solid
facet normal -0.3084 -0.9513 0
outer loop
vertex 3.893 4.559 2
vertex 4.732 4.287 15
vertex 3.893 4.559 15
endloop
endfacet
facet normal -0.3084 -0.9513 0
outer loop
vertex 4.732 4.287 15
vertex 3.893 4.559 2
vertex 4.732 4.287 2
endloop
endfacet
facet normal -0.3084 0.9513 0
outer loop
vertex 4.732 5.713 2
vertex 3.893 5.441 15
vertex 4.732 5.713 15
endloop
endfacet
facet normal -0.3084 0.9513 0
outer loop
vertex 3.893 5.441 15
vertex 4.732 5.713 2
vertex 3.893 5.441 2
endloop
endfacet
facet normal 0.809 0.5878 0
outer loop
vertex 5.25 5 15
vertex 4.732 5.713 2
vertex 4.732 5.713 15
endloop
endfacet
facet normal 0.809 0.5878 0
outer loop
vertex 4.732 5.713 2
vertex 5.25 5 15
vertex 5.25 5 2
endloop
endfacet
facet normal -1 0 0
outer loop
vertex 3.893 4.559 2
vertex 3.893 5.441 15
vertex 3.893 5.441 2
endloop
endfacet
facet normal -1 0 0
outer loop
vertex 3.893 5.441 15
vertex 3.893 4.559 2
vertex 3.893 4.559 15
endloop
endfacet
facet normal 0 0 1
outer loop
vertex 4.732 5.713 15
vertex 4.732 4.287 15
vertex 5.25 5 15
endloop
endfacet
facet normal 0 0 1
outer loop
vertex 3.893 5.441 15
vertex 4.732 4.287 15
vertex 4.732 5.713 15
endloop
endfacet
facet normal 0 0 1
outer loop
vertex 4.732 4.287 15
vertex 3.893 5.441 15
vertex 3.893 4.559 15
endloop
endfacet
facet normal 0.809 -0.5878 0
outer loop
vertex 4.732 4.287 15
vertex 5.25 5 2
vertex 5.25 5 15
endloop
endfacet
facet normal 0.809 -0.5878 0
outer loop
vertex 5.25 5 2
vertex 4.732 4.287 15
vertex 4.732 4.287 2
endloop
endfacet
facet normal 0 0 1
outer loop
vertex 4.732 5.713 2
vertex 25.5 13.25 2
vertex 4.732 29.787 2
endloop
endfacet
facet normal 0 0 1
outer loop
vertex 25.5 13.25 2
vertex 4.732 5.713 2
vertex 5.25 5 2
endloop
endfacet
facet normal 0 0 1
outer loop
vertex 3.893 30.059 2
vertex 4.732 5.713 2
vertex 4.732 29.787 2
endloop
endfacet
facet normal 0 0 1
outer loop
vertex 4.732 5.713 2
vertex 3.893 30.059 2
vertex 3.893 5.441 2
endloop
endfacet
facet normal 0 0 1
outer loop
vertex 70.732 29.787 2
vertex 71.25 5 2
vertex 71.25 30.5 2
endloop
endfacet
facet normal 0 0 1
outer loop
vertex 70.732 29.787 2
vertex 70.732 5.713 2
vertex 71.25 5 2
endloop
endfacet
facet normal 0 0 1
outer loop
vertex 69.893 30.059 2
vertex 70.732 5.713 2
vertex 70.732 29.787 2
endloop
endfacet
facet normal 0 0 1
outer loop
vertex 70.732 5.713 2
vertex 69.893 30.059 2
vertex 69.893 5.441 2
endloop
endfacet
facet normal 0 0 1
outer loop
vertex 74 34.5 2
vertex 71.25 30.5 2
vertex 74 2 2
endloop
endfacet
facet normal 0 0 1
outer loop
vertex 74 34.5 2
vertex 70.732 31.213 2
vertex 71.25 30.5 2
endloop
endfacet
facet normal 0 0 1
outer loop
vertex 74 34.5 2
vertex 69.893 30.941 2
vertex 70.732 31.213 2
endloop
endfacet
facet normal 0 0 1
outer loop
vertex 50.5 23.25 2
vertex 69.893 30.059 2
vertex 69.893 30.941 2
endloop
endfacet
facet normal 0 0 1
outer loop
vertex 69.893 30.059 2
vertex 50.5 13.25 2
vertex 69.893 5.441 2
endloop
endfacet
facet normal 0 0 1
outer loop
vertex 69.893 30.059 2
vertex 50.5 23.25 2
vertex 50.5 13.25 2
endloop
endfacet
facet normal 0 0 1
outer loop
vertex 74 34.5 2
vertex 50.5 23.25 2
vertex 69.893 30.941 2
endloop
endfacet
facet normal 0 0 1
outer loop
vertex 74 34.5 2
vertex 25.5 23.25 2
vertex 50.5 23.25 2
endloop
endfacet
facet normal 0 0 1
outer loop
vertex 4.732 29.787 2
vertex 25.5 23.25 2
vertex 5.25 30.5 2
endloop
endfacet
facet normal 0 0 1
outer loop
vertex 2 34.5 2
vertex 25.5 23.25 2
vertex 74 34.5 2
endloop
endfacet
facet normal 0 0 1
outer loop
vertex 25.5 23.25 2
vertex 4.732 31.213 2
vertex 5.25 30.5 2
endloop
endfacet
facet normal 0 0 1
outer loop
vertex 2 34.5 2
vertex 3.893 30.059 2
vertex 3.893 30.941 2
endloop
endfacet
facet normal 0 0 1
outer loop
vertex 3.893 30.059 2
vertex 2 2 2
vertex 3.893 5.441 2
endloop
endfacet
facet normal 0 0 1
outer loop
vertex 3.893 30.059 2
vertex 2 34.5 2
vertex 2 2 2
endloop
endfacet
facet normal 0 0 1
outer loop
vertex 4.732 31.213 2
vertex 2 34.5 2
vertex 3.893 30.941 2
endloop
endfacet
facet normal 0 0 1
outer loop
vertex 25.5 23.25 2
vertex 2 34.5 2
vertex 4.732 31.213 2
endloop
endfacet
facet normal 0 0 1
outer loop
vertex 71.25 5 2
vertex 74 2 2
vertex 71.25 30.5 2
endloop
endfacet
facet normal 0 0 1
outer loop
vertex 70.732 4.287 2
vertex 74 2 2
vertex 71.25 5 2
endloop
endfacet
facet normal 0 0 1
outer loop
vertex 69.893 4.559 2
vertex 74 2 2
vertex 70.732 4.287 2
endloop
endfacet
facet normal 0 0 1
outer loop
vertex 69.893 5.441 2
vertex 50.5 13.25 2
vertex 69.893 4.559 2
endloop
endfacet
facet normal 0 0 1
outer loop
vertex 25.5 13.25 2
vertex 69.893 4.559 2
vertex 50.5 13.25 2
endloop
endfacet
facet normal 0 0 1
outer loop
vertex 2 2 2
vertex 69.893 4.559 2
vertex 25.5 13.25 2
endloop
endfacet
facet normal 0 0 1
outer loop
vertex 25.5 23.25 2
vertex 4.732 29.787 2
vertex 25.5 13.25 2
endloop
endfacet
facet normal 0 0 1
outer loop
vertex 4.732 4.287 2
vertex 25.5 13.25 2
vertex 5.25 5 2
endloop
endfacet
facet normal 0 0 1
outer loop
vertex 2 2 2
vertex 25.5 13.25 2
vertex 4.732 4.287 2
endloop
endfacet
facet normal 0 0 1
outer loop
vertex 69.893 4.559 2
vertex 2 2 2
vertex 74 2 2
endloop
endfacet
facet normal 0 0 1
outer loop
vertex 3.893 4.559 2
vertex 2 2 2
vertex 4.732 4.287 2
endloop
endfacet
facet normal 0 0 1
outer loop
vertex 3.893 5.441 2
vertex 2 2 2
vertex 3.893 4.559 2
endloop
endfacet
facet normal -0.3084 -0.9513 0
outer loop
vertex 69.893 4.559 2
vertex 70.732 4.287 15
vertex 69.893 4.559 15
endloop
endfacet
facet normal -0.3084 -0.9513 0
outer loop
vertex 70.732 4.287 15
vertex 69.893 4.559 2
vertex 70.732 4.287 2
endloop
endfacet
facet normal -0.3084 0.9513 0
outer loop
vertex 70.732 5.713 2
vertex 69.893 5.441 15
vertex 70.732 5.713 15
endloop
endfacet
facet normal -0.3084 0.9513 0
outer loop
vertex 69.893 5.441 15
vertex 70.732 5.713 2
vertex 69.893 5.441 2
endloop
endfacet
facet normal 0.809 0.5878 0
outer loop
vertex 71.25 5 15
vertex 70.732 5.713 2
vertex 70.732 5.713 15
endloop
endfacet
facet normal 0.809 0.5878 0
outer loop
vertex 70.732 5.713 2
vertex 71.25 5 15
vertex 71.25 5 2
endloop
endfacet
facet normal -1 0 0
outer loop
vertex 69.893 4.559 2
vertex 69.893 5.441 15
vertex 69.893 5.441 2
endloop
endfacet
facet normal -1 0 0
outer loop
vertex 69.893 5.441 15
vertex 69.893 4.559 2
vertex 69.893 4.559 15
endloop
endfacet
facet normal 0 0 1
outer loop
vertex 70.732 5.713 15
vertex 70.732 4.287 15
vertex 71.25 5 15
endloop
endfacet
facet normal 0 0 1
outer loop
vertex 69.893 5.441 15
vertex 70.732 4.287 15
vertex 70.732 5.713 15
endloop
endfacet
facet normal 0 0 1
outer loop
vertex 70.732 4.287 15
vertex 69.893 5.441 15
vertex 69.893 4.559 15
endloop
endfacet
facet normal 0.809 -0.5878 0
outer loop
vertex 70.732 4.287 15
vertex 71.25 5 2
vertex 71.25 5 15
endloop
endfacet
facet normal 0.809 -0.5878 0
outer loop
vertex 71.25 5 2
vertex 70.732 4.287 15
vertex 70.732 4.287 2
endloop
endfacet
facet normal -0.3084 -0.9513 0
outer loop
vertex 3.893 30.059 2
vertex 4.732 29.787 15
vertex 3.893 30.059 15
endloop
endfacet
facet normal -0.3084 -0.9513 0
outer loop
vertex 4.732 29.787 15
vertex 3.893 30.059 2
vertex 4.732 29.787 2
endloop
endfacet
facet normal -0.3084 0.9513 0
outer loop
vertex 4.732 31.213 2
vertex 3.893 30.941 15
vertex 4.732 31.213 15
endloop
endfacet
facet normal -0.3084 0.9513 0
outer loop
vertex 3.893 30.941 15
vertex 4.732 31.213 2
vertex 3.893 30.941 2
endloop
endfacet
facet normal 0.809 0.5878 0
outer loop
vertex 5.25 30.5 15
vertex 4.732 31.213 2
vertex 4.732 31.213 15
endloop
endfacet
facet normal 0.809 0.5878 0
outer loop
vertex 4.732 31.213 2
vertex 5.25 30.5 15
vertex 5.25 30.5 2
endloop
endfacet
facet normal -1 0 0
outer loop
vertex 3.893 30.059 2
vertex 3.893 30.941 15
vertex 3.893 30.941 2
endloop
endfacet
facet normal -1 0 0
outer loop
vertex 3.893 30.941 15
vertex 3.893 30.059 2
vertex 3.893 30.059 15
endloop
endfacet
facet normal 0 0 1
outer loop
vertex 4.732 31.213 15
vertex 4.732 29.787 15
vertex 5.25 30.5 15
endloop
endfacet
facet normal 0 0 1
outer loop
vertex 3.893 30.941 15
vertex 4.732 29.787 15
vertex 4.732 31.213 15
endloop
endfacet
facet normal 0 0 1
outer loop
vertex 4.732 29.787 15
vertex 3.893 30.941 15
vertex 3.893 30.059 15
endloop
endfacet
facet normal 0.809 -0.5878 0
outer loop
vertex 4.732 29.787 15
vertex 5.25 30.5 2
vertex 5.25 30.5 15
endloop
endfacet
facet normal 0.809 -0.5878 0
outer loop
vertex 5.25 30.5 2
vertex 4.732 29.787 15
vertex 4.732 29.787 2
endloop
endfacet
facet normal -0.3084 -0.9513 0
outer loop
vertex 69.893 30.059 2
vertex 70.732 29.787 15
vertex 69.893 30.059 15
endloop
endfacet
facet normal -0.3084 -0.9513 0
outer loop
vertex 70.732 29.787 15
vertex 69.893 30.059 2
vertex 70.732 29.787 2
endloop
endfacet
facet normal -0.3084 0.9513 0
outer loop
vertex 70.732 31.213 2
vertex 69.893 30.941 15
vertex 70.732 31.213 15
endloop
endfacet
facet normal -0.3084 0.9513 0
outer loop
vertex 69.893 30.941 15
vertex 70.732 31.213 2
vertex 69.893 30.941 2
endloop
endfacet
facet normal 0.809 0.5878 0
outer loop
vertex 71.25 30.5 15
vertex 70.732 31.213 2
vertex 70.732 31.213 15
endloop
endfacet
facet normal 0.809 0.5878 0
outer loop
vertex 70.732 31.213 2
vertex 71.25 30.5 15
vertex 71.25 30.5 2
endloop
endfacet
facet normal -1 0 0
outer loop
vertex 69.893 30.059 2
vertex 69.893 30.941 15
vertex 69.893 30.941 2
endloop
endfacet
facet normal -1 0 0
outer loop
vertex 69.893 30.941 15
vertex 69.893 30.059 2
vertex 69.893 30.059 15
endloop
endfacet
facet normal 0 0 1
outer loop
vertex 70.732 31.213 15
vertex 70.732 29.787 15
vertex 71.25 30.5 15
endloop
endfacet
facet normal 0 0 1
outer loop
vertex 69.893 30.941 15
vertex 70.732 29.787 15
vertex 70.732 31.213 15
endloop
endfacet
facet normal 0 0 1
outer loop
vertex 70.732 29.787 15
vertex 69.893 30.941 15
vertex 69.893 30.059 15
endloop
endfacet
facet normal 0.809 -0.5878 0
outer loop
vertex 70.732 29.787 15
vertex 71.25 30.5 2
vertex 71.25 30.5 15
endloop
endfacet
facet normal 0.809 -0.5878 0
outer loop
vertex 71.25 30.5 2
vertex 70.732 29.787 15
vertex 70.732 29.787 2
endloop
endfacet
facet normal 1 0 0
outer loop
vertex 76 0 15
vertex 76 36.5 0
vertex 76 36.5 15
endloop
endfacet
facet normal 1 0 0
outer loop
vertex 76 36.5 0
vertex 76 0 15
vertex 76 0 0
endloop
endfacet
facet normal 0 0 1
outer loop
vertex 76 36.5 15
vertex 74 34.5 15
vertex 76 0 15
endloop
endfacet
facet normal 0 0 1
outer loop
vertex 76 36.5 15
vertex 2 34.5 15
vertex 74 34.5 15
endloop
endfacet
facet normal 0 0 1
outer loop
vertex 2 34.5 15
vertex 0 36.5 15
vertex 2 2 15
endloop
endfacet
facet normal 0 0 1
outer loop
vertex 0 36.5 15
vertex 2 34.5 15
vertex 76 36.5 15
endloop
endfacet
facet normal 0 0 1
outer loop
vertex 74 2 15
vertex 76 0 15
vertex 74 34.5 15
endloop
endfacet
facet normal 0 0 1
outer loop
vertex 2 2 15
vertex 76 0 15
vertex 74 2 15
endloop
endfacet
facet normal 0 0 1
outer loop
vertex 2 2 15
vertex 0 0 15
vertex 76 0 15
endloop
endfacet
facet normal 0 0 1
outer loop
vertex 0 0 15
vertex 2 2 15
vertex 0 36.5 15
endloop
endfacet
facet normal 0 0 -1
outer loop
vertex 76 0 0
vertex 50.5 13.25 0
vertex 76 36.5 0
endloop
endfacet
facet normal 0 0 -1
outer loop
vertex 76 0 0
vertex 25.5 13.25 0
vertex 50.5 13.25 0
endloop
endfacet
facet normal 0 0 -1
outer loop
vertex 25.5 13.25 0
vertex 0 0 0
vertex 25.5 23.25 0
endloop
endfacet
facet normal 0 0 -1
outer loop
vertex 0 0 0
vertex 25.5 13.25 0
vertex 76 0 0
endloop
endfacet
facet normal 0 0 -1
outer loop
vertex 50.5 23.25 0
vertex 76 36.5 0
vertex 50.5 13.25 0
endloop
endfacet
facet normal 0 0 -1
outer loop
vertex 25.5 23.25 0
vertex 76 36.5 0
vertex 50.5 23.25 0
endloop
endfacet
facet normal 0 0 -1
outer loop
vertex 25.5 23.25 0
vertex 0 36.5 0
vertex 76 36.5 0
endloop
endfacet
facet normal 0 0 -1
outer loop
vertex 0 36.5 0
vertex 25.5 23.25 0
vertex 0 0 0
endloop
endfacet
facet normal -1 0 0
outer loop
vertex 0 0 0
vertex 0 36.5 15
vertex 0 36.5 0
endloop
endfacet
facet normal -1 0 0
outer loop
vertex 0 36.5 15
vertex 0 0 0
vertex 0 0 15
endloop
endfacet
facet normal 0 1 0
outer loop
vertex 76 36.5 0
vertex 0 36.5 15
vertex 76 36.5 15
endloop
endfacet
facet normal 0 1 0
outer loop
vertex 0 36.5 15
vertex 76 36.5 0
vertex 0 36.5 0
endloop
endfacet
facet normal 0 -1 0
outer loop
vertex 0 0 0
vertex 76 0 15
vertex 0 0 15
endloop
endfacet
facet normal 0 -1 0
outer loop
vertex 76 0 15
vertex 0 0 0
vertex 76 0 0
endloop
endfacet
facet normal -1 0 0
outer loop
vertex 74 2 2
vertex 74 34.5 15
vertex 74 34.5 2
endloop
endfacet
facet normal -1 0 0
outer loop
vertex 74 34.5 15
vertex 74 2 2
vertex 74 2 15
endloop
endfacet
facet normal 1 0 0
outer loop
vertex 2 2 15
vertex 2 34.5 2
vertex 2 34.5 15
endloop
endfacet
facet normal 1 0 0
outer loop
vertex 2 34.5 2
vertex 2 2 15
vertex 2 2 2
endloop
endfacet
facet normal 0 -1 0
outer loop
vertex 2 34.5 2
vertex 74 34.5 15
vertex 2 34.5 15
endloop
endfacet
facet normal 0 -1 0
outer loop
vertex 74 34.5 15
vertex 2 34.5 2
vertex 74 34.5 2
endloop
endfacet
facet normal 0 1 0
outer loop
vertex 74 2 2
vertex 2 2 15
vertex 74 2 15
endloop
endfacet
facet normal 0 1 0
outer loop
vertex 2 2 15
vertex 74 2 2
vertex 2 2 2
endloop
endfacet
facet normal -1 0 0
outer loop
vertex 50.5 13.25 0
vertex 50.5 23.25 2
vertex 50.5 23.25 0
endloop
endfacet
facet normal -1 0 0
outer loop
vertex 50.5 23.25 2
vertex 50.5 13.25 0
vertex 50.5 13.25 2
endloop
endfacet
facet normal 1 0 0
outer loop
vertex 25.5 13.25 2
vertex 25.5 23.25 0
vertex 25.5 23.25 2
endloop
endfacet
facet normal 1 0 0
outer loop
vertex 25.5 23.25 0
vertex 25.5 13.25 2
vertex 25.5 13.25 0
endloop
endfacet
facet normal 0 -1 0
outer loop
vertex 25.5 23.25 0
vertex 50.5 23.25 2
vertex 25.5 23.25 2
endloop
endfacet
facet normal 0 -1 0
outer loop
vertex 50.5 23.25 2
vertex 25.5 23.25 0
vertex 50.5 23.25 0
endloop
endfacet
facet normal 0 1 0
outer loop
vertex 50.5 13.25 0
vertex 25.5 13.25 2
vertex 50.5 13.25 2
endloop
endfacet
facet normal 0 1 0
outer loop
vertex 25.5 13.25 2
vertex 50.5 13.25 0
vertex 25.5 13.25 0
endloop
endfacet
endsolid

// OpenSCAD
BUFFER = 1;
BOARD_LENGTH = 70;
BOARD_DEPTH = 30.5;
HOLE_DIAMETER = 1.5;
HOLE_OFFSET_BOTTOM = 2;
HOLE_OFFSET_LEFT = 1.5;
HOLE_LENGTH = 66;
HOLE_DEPTH = 25.5;
WALL_WIDTH = 2;
DISPLAY_LENGTH = 25;
DISPLAY_DEPTH = 10;

wall_width_2x = WALL_WIDTH * 2;
box_length = BOARD_LENGTH + BUFFER * 2 + wall_width_2x;
box_depth = BOARD_DEPTH + BUFFER * 2 + wall_width_2x;
box_height = 15;

module case() {
    difference() {
        cube([box_length, box_depth, box_height]);

        translate([WALL_WIDTH, WALL_WIDTH, WALL_WIDTH])
        cube([box_length - wall_width_2x, box_depth - wall_width_2x, box_height - WALL_WIDTH]);
    }
}

module display() {
    x_offset = (box_length - DISPLAY_LENGTH) / 2;
    y_offset = (box_depth - DISPLAY_DEPTH) / 2;
    translate([x_offset, y_offset, 0])
    cube([DISPLAY_LENGTH, DISPLAY_DEPTH, WALL_WIDTH]);
}

module pins() {
    hole_left = WALL_WIDTH + BUFFER + HOLE_OFFSET_LEFT;
    hole_bottom = WALL_WIDTH + BUFFER + HOLE_OFFSET_BOTTOM;
    pin_height = box_height - WALL_WIDTH;
    
    translate([hole_left, hole_bottom, WALL_WIDTH])
    cylinder(pin_height, d=HOLE_DIAMETER);
    
    translate([hole_left + HOLE_LENGTH, hole_bottom, WALL_WIDTH])
    cylinder(pin_height, d=HOLE_DIAMETER);
    
    translate([hole_left, hole_bottom + HOLE_DEPTH, WALL_WIDTH])
    cylinder(pin_height, d=HOLE_DIAMETER);
    
    translate([hole_left + HOLE_LENGTH, hole_bottom + HOLE_DEPTH, WALL_WIDTH])
    cylinder(pin_height, d=HOLE_DIAMETER);
}

difference() {
    union() {
        pins();
        case();
    }
    
    display();
}
